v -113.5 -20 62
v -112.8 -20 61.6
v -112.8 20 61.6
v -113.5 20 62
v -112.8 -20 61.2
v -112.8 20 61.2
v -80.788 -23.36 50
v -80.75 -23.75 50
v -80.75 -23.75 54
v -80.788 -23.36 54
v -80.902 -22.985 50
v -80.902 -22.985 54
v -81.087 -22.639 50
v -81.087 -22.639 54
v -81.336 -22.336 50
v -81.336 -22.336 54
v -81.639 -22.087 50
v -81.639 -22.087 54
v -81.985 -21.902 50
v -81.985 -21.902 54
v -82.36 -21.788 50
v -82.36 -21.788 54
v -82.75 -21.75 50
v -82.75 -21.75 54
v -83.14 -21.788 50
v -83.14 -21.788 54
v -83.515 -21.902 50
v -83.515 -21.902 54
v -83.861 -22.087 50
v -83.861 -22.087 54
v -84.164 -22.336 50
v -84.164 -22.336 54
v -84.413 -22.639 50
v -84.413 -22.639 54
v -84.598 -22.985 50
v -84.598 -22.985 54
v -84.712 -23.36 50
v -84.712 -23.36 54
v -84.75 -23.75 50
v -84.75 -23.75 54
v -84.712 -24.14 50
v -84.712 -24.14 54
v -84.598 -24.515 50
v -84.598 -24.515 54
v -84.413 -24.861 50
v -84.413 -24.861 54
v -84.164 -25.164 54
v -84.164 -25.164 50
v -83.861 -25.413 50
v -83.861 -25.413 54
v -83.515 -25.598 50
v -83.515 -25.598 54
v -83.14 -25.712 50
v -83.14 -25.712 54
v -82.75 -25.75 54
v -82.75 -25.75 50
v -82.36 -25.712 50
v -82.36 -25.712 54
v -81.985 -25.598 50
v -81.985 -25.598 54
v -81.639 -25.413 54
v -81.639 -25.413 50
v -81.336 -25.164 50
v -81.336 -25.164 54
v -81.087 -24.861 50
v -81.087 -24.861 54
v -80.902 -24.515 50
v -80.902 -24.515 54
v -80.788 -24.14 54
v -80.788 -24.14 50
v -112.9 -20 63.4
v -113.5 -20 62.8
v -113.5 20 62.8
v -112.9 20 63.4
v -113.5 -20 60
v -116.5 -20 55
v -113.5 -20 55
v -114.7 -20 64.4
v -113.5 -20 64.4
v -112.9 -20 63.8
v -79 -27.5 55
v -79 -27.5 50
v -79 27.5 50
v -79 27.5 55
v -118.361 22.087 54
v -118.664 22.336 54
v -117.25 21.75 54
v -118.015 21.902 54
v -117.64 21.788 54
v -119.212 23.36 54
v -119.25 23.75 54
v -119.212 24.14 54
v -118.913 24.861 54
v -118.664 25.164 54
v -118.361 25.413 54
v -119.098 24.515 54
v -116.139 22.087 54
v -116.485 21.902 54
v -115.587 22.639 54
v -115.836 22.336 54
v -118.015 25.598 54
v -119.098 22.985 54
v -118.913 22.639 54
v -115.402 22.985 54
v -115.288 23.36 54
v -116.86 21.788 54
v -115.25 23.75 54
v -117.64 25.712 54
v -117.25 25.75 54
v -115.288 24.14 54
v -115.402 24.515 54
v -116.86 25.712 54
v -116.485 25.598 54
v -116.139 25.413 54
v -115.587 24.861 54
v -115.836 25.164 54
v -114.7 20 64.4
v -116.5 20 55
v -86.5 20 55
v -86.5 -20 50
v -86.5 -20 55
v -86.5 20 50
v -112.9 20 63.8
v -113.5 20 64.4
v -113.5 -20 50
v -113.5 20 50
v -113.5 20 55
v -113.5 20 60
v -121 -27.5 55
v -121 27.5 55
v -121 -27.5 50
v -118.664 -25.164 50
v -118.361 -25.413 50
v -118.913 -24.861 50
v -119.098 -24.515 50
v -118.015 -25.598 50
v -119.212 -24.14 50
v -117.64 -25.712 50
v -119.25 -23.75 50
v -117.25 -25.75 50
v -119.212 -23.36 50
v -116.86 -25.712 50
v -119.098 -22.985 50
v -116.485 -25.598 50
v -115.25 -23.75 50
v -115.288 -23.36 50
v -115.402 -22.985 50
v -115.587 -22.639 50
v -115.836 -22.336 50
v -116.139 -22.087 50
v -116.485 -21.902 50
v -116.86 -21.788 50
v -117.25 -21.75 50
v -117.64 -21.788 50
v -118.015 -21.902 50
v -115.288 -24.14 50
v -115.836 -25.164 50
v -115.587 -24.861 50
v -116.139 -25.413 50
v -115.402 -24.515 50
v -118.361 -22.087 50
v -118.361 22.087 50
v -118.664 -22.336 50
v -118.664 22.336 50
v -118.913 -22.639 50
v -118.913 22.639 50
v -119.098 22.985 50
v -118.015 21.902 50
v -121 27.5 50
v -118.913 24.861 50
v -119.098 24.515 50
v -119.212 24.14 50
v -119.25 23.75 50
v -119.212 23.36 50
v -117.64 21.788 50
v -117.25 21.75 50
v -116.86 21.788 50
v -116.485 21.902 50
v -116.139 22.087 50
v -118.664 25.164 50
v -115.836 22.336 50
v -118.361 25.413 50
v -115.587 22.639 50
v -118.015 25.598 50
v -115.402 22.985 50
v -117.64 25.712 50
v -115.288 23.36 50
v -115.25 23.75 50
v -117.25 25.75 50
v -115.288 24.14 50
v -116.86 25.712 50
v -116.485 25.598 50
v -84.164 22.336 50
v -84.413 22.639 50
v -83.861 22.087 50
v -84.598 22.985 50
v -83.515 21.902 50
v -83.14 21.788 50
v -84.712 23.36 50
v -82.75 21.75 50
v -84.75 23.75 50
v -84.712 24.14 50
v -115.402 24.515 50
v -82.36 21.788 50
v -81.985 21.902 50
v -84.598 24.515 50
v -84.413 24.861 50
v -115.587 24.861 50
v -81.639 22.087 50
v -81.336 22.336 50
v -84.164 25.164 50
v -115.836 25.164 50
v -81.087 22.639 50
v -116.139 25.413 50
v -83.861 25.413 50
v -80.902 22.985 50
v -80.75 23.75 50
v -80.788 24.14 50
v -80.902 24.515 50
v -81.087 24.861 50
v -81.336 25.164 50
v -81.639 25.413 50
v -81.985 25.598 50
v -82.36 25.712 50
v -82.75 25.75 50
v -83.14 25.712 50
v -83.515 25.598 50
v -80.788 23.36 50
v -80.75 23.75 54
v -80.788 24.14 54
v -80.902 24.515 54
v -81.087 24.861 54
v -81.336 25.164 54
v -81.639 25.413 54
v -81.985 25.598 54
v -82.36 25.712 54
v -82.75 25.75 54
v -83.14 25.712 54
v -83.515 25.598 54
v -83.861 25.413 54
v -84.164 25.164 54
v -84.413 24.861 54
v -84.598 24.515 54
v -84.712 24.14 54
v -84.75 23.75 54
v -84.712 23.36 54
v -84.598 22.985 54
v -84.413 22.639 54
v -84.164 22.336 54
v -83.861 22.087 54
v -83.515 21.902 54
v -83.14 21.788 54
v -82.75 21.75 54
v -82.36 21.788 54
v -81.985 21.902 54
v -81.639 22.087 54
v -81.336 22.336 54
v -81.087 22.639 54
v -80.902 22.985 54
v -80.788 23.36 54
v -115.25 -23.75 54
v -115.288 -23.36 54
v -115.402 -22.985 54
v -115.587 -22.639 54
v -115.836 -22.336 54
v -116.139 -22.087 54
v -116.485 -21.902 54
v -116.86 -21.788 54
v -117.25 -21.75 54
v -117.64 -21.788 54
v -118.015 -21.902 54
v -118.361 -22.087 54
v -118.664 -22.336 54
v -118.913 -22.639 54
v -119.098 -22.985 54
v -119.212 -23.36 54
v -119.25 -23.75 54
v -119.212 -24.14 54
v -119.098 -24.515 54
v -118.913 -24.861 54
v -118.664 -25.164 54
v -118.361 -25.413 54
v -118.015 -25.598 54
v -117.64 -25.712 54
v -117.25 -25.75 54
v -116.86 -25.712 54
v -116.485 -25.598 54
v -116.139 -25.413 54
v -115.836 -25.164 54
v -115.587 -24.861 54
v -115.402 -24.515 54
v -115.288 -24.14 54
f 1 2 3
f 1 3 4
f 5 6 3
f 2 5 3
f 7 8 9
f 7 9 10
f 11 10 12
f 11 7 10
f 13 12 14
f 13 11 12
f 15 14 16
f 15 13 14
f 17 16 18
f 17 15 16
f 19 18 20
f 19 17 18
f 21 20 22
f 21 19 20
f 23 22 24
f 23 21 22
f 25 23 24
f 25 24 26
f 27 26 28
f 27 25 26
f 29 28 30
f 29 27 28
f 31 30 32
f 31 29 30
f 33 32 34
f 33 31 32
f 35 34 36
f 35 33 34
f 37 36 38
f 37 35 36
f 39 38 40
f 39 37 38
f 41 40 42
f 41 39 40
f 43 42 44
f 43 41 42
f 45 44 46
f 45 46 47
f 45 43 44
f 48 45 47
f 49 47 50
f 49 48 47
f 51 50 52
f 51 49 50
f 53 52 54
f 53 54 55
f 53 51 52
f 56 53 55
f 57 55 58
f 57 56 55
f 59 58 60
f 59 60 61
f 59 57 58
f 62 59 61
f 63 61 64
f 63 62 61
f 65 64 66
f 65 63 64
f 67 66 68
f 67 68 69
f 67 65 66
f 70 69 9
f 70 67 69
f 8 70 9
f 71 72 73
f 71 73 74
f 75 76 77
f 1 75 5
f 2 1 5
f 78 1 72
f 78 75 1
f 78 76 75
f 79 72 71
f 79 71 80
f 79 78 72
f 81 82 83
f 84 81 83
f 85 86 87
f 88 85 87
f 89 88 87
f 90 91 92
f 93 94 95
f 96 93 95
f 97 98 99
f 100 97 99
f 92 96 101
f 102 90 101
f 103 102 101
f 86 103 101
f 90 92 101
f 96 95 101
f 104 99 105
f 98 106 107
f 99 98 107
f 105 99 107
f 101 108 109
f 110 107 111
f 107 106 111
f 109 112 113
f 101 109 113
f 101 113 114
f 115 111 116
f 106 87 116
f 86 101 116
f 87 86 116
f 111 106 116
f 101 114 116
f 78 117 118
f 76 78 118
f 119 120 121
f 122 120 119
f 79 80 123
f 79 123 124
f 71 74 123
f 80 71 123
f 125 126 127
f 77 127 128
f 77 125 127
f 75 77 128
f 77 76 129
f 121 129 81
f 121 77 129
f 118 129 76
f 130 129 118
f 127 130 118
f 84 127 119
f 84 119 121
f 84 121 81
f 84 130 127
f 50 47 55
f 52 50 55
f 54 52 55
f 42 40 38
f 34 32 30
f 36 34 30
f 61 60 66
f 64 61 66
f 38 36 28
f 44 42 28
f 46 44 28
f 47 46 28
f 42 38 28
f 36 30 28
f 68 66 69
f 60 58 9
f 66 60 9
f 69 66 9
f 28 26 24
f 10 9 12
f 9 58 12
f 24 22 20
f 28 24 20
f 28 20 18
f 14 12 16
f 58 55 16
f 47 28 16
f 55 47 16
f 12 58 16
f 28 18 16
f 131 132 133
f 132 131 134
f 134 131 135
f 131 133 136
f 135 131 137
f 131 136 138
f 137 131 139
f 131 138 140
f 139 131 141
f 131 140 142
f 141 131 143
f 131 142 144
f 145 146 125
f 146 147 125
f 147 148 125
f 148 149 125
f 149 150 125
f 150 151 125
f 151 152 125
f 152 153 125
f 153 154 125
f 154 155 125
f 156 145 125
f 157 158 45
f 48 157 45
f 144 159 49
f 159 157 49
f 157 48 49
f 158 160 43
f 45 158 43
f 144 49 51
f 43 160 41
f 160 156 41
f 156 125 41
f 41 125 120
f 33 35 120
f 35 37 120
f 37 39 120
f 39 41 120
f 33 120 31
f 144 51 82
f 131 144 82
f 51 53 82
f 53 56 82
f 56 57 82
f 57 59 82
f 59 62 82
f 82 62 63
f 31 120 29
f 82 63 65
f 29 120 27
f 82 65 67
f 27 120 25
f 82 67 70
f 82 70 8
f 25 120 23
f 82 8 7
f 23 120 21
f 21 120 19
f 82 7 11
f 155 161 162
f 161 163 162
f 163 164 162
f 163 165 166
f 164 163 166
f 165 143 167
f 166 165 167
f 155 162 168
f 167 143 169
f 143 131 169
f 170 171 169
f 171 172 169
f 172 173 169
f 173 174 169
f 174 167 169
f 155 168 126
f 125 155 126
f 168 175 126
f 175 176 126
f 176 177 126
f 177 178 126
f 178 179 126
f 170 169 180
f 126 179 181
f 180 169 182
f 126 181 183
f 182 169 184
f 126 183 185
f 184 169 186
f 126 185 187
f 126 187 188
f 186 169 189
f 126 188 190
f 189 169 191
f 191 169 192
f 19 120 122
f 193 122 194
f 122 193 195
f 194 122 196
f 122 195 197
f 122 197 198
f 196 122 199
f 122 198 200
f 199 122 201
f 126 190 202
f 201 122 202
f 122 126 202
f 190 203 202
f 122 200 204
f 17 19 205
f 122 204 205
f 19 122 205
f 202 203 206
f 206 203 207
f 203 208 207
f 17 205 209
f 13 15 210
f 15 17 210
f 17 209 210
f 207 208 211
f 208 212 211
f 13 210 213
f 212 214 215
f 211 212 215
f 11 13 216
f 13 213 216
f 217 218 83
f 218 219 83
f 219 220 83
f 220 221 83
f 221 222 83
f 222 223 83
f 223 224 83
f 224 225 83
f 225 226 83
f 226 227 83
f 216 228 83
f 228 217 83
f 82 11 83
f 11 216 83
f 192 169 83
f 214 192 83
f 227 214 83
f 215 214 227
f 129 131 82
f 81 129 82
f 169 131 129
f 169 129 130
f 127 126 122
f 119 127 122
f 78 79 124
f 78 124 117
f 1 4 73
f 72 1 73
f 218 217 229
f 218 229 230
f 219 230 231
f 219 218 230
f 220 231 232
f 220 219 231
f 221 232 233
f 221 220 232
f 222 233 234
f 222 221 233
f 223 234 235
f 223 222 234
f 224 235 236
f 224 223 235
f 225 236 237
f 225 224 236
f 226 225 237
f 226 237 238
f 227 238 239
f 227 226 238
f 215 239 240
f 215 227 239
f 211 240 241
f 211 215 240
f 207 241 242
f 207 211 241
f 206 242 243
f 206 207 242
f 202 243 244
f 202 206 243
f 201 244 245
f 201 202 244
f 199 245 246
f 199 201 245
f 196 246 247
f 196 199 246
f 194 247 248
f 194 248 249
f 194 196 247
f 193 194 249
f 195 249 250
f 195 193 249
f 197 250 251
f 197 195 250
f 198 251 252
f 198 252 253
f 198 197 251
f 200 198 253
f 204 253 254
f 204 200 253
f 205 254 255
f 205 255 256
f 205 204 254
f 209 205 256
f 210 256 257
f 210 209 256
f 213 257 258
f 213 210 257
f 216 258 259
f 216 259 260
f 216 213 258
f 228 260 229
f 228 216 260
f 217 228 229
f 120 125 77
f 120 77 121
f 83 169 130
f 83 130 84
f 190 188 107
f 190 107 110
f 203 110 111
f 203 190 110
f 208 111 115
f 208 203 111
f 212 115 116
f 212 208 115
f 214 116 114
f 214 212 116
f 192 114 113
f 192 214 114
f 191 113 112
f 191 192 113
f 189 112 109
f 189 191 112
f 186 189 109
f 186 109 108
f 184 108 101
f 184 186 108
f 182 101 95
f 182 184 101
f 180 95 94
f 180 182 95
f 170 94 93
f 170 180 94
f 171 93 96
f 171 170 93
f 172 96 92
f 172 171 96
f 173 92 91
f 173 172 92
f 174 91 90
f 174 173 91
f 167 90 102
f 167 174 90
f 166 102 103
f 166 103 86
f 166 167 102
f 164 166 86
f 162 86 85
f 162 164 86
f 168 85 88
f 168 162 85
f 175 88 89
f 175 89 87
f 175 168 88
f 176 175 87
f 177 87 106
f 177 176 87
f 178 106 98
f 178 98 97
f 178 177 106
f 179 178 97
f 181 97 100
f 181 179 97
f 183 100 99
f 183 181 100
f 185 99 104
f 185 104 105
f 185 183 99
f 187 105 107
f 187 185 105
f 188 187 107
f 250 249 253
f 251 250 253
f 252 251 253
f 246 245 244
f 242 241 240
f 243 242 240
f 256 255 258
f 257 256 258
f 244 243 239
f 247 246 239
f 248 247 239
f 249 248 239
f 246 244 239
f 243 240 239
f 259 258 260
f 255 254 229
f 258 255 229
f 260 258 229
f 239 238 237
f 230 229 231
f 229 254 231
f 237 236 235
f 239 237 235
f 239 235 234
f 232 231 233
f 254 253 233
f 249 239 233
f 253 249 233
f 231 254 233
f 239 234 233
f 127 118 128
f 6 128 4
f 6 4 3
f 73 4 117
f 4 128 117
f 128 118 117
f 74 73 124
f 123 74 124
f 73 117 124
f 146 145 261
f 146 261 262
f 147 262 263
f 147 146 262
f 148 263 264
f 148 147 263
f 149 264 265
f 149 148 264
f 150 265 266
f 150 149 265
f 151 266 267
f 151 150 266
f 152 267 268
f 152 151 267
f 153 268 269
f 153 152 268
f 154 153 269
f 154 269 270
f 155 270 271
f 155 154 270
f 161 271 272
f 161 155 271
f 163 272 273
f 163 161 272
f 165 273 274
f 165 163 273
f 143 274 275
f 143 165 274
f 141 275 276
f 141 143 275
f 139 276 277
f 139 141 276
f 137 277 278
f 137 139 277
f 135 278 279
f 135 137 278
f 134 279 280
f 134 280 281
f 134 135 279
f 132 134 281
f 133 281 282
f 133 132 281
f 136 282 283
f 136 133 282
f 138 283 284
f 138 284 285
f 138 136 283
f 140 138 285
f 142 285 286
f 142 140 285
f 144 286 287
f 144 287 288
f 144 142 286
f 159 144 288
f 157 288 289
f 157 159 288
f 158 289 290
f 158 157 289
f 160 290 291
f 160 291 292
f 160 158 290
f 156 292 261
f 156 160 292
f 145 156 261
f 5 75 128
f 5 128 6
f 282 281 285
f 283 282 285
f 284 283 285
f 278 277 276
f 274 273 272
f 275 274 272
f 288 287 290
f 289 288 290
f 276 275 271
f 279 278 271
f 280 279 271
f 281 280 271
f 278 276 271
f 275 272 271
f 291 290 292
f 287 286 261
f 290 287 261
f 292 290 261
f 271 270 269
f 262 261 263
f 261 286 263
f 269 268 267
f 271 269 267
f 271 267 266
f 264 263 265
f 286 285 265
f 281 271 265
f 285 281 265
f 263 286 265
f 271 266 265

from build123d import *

# Parameters (mm, degrees)
SKETCH009_W     = 42
SKETCH009_H     = 55
SKETCH009_W_2   = 27
SKETCH009_H_2   = 40
PAD004_DEPTH    = 5
SKETCH010_R     = 2
POCKET004_DEPTH = 4
PAD005_DEPTH    = 20


with BuildPart() as part:
    # Sketch009 → Pad004 (new body)
    with BuildSketch(Plane.XY):
        Rectangle(SKETCH009_W, SKETCH009_H)
        Rectangle(SKETCH009_W_2, SKETCH009_H_2, mode=Mode.SUBTRACT)
    extrude(amount=PAD004_DEPTH)

    # Sketch010 → Pocket004 (cut)
    with BuildSketch(Plane.XY):
        with Locations((-17.25, 23.75)):
            Circle(SKETCH010_R)
        with Locations((17.25, 23.75)):
            Circle(SKETCH010_R)
        with Locations((17.25, -23.75)):
            Circle(SKETCH010_R)
        with Locations((-17.25, -23.75)):
            Circle(SKETCH010_R)
    extrude(amount=POCKET004_DEPTH, mode=Mode.SUBTRACT)

    # Sketch011 → Pad005 (join, symmetric)
    with BuildSketch(Plane(origin=(0, 0, 5), x_dir=(1, 0, 0), z_dir=(0, -1, 0))):
        Polygon((-13.5, 0), (-13.5, 5), (-12.8, 6.2), (-12.8, 6.6), (-13.5, 7), (-13.5, 7.8), (-12.9, 8.4), (-12.9, 8.8), (-13.5, 9.4), (-14.7, 9.4), (-16.5, 0), align=None)
    extrude(amount=PAD005_DEPTH, both=True)


with BuildPart() as part_1:
    # Body003 placement: moved
    add(part.part.moved(Location((-100, 0, 50))))


solid = part_1.part
